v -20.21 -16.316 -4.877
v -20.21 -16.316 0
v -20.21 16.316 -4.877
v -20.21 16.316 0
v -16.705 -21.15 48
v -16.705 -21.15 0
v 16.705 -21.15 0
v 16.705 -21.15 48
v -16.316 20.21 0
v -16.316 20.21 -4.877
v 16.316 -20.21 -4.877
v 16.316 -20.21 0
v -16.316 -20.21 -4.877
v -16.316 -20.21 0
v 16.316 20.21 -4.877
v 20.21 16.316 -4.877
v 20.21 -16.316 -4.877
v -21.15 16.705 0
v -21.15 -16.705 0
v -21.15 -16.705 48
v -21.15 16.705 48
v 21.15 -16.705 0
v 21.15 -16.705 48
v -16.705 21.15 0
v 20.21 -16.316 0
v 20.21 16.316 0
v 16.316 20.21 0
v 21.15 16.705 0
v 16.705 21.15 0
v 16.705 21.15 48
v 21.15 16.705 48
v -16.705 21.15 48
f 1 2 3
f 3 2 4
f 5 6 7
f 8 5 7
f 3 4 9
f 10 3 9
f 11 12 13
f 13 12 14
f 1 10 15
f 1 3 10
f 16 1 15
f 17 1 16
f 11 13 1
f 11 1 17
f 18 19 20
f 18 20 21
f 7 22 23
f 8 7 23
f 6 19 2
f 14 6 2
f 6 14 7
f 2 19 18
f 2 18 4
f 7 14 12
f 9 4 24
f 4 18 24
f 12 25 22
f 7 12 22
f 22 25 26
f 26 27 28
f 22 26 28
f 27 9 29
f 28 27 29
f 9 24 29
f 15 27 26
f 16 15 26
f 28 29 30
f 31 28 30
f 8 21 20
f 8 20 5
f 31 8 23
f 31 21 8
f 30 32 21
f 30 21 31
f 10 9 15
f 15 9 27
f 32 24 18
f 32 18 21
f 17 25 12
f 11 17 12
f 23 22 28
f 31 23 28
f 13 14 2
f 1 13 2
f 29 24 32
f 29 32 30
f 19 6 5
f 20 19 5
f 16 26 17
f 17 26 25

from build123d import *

# Parameters (mm, degrees)
F0_W     = 42.3
F0_H     = 42.3
F1_DEPTH = 48
F2_SIZE  = 4.445
F4_DEPTH = 4.8768


with BuildPart() as f1:
    # F0 (on Top) → F1 (new body)
    with BuildSketch(Plane.XY):
        Rectangle(F0_W, F0_H)
    extrude(amount=F1_DEPTH)

    # F2
    f2_edges = [f1.edges().sort_by_distance(p)[0] for p in [
        (21.15, 21.15, 24),
        (-21.15, 21.15, 24),
        (-21.15, -21.15, 24),
        (21.15, -21.15, 24),
    ]]
    chamfer(f2_edges, length=F2_SIZE)

    # F3 (on face) → F4 (join)
    with BuildSketch(Plane(origin=(0, 0, 0), x_dir=(1, 0, 0), z_dir=(0, 0, -1))):
        Polygon((-16.315722, -20.2102), (16.315722, -20.2102), (20.2102, -16.315722), (20.2102, 16.315722), (16.315722, 20.2102), (-16.315722, 20.2102), (-20.2102, 16.315722), (-20.2102, -16.315722), align=None)
    extrude(amount=F4_DEPTH)


solid = f1.part
